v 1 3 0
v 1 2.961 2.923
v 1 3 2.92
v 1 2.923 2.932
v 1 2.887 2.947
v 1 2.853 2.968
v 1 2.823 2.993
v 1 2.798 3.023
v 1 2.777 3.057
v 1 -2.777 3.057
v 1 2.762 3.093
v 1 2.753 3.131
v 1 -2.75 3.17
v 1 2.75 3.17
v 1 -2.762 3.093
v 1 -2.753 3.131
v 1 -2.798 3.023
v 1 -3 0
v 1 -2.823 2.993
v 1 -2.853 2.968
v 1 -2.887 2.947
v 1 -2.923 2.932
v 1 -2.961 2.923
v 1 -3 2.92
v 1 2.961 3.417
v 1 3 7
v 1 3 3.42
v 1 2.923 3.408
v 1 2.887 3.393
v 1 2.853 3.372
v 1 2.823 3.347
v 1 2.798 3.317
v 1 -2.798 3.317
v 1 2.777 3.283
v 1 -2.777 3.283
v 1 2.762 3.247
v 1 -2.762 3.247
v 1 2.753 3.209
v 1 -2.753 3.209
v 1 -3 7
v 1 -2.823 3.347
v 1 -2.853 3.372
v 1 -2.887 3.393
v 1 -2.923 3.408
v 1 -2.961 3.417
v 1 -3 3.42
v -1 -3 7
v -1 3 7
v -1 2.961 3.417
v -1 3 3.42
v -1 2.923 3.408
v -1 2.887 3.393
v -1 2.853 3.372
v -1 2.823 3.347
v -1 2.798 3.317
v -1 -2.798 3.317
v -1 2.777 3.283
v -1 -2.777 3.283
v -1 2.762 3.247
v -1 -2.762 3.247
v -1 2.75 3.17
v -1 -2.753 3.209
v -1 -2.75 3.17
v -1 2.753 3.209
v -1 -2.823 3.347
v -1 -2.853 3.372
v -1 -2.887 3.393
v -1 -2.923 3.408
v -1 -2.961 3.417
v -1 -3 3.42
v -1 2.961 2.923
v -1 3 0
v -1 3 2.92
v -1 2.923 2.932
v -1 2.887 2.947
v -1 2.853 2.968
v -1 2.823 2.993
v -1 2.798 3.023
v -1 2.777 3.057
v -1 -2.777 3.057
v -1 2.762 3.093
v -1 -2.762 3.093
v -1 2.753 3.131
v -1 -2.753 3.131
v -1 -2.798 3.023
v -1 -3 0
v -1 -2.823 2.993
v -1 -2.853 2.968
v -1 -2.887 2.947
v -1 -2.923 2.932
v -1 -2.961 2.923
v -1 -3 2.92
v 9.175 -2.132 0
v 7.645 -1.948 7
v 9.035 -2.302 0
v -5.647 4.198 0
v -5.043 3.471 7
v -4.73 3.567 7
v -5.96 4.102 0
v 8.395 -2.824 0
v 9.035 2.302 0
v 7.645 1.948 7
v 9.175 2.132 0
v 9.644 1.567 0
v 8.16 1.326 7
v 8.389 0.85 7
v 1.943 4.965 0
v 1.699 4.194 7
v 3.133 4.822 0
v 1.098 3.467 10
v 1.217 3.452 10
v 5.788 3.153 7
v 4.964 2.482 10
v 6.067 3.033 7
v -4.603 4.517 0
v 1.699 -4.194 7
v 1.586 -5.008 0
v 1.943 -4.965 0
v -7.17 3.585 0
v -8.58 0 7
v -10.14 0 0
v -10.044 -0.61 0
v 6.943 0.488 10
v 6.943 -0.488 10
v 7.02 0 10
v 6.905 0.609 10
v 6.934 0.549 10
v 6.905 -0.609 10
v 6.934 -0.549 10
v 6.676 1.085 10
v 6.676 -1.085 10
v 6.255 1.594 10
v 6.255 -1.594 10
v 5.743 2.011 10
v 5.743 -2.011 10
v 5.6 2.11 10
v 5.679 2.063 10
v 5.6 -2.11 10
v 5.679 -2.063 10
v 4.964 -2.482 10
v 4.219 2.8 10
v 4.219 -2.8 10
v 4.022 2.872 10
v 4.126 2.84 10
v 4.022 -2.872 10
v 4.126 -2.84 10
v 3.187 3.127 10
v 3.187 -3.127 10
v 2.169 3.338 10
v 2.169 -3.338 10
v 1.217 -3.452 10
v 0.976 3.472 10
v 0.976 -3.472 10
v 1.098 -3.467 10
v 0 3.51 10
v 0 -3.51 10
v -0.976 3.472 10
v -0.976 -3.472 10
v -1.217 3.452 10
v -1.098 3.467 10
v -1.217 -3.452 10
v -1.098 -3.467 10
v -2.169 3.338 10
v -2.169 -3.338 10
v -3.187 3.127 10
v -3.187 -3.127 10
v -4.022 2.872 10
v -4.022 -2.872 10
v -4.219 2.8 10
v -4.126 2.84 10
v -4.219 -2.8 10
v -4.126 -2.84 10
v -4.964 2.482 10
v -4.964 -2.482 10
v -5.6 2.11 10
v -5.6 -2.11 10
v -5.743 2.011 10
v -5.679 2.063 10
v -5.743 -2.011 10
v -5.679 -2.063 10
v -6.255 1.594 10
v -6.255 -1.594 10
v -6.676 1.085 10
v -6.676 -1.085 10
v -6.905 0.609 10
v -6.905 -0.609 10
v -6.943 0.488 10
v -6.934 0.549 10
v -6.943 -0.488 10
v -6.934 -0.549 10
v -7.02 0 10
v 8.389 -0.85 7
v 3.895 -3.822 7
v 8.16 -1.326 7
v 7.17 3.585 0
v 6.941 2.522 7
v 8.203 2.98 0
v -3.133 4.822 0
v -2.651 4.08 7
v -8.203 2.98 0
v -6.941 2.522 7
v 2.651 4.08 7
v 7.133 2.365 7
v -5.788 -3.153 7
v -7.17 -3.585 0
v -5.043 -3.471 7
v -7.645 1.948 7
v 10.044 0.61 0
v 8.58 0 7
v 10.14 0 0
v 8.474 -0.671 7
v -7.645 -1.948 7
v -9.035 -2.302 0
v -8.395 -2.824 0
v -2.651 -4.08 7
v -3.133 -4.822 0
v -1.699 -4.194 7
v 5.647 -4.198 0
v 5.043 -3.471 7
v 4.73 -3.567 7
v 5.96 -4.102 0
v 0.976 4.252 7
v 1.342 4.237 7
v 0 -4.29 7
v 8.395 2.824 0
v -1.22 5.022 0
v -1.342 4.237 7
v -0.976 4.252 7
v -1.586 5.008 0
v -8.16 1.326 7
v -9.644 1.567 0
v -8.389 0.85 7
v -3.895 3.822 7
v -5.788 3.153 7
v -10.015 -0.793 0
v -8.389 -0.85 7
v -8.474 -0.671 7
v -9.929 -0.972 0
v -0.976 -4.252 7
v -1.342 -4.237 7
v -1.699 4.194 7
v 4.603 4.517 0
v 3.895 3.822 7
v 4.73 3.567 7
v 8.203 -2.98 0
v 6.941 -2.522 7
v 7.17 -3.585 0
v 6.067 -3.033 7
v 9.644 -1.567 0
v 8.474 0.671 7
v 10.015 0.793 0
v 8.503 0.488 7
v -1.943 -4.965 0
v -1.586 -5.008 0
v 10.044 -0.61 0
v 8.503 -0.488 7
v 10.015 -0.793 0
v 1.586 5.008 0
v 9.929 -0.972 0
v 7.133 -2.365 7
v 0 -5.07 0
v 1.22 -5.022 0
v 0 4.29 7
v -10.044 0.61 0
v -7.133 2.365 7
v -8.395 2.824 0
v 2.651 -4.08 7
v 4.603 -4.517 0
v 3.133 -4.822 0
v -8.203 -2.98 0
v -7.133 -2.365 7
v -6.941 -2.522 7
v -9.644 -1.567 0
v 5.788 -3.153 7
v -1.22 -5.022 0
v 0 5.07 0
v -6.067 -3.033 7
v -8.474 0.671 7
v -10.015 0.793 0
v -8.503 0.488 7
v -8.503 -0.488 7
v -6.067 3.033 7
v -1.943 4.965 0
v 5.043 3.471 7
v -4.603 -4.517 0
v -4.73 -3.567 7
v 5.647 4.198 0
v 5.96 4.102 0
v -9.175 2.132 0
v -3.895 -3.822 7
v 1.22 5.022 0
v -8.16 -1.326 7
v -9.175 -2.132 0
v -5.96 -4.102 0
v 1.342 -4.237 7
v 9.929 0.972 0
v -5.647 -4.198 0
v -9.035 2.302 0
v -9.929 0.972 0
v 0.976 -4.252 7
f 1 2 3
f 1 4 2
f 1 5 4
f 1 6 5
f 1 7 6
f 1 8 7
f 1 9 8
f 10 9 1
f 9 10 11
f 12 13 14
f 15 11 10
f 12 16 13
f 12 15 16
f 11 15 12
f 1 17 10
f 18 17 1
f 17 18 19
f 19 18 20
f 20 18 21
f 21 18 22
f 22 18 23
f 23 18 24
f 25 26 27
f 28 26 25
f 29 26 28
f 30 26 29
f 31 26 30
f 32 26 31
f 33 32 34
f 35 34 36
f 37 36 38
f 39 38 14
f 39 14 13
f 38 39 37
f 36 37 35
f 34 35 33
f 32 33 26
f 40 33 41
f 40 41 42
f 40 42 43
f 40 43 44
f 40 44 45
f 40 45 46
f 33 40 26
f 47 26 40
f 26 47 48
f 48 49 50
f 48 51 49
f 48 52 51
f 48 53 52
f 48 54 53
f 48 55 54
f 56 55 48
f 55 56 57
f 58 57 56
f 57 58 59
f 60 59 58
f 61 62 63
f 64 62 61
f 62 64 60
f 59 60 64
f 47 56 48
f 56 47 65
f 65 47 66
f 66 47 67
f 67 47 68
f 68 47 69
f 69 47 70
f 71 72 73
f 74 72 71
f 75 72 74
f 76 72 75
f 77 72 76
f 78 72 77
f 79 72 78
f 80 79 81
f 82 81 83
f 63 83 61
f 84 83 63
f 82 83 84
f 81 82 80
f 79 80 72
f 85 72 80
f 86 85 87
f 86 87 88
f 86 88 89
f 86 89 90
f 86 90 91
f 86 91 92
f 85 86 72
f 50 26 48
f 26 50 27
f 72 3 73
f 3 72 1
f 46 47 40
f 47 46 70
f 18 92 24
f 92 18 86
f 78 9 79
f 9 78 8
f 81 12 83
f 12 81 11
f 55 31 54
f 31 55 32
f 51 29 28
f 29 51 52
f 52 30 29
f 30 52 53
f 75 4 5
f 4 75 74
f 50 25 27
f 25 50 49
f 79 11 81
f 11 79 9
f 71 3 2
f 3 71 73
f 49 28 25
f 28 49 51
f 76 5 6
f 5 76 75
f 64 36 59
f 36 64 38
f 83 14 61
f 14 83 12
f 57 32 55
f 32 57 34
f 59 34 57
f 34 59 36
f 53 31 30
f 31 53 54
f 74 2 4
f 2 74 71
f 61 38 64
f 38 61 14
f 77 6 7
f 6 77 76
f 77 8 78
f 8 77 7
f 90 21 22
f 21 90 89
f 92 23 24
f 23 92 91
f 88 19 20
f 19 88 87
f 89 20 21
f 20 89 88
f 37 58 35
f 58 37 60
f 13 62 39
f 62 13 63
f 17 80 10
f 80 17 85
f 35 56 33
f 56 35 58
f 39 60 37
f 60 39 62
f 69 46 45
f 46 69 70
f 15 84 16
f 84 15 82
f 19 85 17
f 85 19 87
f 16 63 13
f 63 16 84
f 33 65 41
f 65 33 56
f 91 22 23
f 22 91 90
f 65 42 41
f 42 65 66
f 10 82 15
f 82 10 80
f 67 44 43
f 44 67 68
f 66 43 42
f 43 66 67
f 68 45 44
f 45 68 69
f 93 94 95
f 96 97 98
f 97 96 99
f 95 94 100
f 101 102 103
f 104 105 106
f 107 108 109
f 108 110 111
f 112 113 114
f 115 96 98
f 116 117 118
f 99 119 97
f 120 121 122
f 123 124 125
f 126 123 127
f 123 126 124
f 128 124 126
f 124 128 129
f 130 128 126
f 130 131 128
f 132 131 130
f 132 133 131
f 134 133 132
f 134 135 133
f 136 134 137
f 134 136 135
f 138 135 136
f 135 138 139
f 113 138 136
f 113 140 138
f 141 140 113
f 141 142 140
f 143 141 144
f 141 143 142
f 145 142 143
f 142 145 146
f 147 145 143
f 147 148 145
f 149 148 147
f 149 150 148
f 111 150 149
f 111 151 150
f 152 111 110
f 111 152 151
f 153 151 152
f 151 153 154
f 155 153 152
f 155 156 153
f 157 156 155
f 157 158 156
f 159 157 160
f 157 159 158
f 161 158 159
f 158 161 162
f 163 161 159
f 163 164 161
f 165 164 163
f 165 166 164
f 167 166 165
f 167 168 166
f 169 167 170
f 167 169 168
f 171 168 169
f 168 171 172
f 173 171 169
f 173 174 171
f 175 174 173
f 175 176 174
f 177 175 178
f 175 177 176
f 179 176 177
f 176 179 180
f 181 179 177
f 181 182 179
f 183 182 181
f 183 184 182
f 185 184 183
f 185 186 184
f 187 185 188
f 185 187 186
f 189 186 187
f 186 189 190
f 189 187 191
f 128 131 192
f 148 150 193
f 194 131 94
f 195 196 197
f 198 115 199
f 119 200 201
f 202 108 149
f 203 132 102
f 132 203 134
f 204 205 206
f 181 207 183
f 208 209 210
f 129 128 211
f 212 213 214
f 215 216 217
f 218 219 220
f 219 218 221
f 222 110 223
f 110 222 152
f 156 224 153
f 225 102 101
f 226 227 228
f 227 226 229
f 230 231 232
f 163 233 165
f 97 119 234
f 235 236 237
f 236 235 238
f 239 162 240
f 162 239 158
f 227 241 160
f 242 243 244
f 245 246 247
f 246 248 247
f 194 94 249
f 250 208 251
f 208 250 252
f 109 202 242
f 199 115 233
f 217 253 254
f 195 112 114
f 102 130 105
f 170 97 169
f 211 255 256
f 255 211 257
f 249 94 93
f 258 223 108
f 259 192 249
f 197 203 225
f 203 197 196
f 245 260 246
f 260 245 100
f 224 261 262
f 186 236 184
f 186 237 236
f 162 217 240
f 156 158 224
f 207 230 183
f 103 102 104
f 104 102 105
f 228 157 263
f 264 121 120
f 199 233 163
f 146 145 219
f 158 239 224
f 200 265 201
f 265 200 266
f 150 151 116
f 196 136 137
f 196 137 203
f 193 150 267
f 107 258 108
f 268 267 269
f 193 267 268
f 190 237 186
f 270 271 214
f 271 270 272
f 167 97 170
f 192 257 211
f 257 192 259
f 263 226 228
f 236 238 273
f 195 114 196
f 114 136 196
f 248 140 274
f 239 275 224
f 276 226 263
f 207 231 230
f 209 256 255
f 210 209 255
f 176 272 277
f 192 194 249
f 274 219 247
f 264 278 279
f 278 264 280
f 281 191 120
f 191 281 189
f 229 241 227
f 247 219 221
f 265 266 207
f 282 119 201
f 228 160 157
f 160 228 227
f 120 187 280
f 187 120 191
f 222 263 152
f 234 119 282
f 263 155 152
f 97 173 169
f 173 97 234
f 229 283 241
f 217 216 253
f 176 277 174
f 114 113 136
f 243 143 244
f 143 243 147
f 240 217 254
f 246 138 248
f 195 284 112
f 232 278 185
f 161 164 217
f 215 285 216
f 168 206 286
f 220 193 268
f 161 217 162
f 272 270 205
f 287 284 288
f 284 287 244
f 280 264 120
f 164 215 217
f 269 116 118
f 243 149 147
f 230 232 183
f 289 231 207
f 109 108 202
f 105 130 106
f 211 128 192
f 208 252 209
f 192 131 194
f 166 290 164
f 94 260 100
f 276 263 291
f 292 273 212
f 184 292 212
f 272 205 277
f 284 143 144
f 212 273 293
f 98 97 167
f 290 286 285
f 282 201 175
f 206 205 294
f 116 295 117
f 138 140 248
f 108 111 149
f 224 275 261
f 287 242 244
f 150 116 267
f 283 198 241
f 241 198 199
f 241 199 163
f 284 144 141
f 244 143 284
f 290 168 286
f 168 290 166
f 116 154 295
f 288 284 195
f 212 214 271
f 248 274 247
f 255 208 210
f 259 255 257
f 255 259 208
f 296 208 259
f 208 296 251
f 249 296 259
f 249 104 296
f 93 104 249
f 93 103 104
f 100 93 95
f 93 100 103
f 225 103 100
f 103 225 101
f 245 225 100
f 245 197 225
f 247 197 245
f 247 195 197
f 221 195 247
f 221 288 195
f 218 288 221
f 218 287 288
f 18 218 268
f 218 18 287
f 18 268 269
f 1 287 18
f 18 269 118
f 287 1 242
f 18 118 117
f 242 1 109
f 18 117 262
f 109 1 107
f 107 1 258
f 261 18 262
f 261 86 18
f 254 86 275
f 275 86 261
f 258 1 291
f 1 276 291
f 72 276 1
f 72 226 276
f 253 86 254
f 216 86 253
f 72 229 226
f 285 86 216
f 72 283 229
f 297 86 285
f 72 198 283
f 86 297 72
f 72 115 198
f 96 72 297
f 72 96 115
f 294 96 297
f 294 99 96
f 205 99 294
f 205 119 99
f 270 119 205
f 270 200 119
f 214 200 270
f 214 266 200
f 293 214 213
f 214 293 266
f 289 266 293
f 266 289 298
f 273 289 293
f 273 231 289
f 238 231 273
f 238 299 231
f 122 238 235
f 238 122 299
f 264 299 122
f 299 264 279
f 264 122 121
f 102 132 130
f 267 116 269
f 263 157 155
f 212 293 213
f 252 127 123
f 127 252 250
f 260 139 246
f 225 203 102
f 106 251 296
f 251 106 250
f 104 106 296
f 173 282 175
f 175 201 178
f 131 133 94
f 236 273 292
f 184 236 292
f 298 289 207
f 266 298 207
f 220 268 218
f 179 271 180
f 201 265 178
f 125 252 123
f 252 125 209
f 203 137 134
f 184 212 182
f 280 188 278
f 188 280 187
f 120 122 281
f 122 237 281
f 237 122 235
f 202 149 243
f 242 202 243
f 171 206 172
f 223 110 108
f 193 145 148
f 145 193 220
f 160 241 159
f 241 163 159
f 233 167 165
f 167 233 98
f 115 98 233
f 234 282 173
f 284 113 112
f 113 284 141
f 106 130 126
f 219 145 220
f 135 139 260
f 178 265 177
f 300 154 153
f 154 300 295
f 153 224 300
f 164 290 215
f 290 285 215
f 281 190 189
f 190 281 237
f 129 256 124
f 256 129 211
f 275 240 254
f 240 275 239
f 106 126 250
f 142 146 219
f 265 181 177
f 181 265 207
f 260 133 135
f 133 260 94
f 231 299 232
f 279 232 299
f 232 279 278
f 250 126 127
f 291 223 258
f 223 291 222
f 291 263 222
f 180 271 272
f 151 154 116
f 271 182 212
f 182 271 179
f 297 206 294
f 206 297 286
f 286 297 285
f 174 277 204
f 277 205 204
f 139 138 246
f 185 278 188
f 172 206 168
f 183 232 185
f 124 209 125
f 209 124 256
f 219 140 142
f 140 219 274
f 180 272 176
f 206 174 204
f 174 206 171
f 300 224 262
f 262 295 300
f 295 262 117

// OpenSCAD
// Matthew Sparks
// 2017-09-09
//
// units in 1mm
// Slider for fitting Lutron-type dimmer slide switches

knobHeight = 10; // total height of knob
bevelMargin = 0.30; // Determines bezel position relative to height, use 0-0.5

slotWidth = 2; // width of rear slot
slotDepth = 7; // depth of rear slot.  Controls distance from switch panel
slotHeight = 6; // height of rear slot
bumpIndent = 0.25; // size of slot indents to latch onto switch stem
bumpPosition = 3.83; // position of slot indents to latch onto switch stem

$fn = 40;

difference(){
    scale([0.78,0.39,1]){
        minkowski(){
            scale([1,1,1]){
                cylinder(knobHeight-(((bevelMargin)*knobHeight)),10,8,false);
            };
            cylinder(bevelMargin*knobHeight,3,false);
        }
    }

    difference(){
        translate([-(slotWidth/2),-(slotHeight/2),-(slotDepth*0.1)]){
            cube([slotWidth,slotHeight,slotDepth*1.1],false);
        }
        translate([0,(slotHeight/2),(slotDepth-bumpPosition)]){
            rotate([0,90,0]){
                cylinder(slotWidth*1.1,bumpIndent,bumpIndent,true);
            }
        }
        translate([0,-(slotHeight/2),(slotDepth-bumpPosition)]){
            rotate([0,90,0]){
                cylinder(slotWidth*1.1,bumpIndent,bumpIndent,true);
            }
        }
    }
}
